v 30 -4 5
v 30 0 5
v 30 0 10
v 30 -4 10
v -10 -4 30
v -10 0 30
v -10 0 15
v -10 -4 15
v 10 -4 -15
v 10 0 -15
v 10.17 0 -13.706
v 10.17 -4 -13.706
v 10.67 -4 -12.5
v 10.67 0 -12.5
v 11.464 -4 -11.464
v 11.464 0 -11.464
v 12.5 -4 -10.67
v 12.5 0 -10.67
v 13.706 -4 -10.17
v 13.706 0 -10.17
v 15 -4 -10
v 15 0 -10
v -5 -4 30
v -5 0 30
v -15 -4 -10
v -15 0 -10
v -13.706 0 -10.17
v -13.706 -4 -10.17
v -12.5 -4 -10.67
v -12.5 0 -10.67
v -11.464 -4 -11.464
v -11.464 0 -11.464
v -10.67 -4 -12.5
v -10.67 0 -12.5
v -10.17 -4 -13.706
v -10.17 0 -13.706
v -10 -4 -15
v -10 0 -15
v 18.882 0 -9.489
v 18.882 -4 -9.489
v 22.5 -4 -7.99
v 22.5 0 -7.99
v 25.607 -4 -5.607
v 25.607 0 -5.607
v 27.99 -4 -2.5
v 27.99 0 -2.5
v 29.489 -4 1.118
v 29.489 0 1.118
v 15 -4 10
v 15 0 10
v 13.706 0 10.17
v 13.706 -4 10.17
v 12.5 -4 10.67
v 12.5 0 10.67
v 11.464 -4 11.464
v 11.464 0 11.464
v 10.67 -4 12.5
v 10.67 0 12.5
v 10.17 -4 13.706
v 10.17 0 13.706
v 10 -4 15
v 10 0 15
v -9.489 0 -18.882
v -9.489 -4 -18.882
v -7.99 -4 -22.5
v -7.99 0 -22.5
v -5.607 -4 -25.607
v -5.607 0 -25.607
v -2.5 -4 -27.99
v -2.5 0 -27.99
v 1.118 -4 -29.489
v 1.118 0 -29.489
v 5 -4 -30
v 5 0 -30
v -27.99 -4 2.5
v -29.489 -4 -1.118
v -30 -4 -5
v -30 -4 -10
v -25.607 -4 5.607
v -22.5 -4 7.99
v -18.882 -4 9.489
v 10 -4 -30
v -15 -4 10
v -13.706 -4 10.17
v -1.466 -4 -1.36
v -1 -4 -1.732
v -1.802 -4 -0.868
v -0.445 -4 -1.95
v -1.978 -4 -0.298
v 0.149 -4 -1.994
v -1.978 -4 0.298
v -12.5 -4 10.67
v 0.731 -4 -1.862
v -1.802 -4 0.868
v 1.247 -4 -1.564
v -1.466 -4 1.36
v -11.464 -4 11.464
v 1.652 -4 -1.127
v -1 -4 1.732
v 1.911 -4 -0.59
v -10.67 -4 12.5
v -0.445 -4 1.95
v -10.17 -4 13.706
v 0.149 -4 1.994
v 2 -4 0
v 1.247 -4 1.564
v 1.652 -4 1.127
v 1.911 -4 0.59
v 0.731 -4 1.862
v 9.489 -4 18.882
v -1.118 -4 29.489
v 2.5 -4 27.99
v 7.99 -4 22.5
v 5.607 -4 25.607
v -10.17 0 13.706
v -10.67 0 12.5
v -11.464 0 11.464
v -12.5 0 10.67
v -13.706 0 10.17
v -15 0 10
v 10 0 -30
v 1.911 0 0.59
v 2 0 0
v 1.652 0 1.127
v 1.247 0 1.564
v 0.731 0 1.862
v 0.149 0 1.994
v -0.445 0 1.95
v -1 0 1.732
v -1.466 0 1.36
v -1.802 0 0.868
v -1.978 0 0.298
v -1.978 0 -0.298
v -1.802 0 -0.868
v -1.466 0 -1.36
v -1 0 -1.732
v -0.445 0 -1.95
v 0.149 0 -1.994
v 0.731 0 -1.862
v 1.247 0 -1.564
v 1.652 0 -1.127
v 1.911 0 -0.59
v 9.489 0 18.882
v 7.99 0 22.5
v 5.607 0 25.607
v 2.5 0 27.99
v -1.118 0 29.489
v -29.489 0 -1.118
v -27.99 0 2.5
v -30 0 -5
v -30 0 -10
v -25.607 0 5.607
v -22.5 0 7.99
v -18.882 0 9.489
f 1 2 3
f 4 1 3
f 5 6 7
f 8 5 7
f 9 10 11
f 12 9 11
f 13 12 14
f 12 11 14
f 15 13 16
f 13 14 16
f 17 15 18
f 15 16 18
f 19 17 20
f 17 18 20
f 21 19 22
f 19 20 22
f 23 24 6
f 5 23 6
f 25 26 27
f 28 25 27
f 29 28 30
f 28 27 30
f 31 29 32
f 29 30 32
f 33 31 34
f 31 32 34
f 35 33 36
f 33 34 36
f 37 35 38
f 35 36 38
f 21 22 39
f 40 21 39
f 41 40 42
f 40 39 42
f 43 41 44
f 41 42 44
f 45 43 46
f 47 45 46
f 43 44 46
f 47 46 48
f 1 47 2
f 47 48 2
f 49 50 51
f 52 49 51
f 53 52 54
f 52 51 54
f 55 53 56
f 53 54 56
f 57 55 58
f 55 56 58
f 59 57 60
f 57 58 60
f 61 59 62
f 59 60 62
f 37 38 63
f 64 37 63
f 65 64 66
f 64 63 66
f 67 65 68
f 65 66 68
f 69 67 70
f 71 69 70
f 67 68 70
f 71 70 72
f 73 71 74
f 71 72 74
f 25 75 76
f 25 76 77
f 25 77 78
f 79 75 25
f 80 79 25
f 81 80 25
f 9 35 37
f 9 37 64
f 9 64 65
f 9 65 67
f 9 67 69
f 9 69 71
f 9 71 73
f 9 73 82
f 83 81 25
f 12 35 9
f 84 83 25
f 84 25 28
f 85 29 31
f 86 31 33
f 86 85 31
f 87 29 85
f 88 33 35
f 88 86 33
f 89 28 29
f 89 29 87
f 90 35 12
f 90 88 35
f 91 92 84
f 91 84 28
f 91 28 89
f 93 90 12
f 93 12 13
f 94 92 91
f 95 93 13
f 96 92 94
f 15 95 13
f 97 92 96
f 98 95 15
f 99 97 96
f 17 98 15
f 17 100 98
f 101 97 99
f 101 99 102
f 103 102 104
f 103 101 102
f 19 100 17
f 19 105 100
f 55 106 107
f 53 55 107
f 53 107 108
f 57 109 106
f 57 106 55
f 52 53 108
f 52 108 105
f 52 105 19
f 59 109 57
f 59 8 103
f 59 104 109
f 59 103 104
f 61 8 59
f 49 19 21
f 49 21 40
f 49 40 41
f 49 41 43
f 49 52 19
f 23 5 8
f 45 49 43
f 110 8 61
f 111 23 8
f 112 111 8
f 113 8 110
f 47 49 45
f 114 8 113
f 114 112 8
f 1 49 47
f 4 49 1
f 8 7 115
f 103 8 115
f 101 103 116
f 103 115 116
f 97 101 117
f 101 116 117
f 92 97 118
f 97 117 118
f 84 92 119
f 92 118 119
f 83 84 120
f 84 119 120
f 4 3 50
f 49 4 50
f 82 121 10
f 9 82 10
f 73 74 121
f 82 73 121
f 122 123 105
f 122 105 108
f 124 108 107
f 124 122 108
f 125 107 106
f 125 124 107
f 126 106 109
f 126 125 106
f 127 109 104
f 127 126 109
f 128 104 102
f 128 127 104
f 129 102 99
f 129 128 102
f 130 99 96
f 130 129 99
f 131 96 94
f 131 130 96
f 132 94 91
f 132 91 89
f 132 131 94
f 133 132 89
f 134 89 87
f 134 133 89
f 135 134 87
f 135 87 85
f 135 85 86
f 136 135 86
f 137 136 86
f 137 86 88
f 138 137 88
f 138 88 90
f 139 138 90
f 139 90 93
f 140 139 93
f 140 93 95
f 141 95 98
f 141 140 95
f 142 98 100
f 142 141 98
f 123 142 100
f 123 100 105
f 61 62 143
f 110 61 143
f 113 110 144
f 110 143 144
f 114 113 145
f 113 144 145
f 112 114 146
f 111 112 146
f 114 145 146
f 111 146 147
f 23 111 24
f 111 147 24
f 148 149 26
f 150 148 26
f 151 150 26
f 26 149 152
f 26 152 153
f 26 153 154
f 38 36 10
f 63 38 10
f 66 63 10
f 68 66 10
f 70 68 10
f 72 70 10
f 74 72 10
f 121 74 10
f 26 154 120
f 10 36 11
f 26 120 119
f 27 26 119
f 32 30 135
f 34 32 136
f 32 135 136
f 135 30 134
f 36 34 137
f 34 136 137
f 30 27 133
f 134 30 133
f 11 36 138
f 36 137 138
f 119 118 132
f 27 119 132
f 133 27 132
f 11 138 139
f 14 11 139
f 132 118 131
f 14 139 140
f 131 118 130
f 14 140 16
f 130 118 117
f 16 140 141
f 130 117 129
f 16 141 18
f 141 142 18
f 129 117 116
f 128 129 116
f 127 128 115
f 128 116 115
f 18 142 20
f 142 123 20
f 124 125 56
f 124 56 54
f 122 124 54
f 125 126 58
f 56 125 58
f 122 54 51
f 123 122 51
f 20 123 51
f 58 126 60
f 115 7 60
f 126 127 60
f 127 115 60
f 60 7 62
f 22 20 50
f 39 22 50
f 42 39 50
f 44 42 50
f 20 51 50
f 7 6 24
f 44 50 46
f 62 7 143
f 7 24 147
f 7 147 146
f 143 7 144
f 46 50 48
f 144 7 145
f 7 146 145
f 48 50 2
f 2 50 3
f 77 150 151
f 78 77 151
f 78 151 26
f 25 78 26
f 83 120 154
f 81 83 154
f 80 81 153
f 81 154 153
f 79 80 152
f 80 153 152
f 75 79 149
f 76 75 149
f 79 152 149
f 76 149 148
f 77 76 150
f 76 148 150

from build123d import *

# Parameters (mm, degrees)
F1_R     = 2
F2_DEPTH = 4


with BuildPart() as f2:
    # F1 (on Front) → F2 (new body)
    with BuildSketch(Plane.XZ):
        with BuildLine():
            ThreePointArc((10, 15), (5.606602, 25.606602), (-5, 30))
            Line((-5, 30), (-10, 30))
            Line((-10, 30), (-10, 15))
            ThreePointArc((-10, 15), (-11.464466, 11.464466), (-15, 10))
            ThreePointArc((-15, 10), (-25.606602, 5.606602), (-30, -5))
            Line((-30, -5), (-30, -10))
            Line((-30, -10), (-15, -10))
            ThreePointArc((-15, -10), (-11.464466, -11.464466), (-10, -15))
            ThreePointArc((-10, -15), (-5.606602, -25.606602), (5, -30))
            Line((5, -30), (10, -30))
            Line((10, -30), (10, -15))
            ThreePointArc((10, -15), (11.464466, -11.464466), (15, -10))
            ThreePointArc((15, -10), (25.606602, -5.606602), (30, 5))
            Line((30, 5), (30, 10))
            Line((30, 10), (15, 10))
            ThreePointArc((15, 10), (11.464466, 11.464466), (10, 15))
        make_face()
        Circle(F1_R, mode=Mode.SUBTRACT)
    extrude(amount=F2_DEPTH)


solid = f2.part
